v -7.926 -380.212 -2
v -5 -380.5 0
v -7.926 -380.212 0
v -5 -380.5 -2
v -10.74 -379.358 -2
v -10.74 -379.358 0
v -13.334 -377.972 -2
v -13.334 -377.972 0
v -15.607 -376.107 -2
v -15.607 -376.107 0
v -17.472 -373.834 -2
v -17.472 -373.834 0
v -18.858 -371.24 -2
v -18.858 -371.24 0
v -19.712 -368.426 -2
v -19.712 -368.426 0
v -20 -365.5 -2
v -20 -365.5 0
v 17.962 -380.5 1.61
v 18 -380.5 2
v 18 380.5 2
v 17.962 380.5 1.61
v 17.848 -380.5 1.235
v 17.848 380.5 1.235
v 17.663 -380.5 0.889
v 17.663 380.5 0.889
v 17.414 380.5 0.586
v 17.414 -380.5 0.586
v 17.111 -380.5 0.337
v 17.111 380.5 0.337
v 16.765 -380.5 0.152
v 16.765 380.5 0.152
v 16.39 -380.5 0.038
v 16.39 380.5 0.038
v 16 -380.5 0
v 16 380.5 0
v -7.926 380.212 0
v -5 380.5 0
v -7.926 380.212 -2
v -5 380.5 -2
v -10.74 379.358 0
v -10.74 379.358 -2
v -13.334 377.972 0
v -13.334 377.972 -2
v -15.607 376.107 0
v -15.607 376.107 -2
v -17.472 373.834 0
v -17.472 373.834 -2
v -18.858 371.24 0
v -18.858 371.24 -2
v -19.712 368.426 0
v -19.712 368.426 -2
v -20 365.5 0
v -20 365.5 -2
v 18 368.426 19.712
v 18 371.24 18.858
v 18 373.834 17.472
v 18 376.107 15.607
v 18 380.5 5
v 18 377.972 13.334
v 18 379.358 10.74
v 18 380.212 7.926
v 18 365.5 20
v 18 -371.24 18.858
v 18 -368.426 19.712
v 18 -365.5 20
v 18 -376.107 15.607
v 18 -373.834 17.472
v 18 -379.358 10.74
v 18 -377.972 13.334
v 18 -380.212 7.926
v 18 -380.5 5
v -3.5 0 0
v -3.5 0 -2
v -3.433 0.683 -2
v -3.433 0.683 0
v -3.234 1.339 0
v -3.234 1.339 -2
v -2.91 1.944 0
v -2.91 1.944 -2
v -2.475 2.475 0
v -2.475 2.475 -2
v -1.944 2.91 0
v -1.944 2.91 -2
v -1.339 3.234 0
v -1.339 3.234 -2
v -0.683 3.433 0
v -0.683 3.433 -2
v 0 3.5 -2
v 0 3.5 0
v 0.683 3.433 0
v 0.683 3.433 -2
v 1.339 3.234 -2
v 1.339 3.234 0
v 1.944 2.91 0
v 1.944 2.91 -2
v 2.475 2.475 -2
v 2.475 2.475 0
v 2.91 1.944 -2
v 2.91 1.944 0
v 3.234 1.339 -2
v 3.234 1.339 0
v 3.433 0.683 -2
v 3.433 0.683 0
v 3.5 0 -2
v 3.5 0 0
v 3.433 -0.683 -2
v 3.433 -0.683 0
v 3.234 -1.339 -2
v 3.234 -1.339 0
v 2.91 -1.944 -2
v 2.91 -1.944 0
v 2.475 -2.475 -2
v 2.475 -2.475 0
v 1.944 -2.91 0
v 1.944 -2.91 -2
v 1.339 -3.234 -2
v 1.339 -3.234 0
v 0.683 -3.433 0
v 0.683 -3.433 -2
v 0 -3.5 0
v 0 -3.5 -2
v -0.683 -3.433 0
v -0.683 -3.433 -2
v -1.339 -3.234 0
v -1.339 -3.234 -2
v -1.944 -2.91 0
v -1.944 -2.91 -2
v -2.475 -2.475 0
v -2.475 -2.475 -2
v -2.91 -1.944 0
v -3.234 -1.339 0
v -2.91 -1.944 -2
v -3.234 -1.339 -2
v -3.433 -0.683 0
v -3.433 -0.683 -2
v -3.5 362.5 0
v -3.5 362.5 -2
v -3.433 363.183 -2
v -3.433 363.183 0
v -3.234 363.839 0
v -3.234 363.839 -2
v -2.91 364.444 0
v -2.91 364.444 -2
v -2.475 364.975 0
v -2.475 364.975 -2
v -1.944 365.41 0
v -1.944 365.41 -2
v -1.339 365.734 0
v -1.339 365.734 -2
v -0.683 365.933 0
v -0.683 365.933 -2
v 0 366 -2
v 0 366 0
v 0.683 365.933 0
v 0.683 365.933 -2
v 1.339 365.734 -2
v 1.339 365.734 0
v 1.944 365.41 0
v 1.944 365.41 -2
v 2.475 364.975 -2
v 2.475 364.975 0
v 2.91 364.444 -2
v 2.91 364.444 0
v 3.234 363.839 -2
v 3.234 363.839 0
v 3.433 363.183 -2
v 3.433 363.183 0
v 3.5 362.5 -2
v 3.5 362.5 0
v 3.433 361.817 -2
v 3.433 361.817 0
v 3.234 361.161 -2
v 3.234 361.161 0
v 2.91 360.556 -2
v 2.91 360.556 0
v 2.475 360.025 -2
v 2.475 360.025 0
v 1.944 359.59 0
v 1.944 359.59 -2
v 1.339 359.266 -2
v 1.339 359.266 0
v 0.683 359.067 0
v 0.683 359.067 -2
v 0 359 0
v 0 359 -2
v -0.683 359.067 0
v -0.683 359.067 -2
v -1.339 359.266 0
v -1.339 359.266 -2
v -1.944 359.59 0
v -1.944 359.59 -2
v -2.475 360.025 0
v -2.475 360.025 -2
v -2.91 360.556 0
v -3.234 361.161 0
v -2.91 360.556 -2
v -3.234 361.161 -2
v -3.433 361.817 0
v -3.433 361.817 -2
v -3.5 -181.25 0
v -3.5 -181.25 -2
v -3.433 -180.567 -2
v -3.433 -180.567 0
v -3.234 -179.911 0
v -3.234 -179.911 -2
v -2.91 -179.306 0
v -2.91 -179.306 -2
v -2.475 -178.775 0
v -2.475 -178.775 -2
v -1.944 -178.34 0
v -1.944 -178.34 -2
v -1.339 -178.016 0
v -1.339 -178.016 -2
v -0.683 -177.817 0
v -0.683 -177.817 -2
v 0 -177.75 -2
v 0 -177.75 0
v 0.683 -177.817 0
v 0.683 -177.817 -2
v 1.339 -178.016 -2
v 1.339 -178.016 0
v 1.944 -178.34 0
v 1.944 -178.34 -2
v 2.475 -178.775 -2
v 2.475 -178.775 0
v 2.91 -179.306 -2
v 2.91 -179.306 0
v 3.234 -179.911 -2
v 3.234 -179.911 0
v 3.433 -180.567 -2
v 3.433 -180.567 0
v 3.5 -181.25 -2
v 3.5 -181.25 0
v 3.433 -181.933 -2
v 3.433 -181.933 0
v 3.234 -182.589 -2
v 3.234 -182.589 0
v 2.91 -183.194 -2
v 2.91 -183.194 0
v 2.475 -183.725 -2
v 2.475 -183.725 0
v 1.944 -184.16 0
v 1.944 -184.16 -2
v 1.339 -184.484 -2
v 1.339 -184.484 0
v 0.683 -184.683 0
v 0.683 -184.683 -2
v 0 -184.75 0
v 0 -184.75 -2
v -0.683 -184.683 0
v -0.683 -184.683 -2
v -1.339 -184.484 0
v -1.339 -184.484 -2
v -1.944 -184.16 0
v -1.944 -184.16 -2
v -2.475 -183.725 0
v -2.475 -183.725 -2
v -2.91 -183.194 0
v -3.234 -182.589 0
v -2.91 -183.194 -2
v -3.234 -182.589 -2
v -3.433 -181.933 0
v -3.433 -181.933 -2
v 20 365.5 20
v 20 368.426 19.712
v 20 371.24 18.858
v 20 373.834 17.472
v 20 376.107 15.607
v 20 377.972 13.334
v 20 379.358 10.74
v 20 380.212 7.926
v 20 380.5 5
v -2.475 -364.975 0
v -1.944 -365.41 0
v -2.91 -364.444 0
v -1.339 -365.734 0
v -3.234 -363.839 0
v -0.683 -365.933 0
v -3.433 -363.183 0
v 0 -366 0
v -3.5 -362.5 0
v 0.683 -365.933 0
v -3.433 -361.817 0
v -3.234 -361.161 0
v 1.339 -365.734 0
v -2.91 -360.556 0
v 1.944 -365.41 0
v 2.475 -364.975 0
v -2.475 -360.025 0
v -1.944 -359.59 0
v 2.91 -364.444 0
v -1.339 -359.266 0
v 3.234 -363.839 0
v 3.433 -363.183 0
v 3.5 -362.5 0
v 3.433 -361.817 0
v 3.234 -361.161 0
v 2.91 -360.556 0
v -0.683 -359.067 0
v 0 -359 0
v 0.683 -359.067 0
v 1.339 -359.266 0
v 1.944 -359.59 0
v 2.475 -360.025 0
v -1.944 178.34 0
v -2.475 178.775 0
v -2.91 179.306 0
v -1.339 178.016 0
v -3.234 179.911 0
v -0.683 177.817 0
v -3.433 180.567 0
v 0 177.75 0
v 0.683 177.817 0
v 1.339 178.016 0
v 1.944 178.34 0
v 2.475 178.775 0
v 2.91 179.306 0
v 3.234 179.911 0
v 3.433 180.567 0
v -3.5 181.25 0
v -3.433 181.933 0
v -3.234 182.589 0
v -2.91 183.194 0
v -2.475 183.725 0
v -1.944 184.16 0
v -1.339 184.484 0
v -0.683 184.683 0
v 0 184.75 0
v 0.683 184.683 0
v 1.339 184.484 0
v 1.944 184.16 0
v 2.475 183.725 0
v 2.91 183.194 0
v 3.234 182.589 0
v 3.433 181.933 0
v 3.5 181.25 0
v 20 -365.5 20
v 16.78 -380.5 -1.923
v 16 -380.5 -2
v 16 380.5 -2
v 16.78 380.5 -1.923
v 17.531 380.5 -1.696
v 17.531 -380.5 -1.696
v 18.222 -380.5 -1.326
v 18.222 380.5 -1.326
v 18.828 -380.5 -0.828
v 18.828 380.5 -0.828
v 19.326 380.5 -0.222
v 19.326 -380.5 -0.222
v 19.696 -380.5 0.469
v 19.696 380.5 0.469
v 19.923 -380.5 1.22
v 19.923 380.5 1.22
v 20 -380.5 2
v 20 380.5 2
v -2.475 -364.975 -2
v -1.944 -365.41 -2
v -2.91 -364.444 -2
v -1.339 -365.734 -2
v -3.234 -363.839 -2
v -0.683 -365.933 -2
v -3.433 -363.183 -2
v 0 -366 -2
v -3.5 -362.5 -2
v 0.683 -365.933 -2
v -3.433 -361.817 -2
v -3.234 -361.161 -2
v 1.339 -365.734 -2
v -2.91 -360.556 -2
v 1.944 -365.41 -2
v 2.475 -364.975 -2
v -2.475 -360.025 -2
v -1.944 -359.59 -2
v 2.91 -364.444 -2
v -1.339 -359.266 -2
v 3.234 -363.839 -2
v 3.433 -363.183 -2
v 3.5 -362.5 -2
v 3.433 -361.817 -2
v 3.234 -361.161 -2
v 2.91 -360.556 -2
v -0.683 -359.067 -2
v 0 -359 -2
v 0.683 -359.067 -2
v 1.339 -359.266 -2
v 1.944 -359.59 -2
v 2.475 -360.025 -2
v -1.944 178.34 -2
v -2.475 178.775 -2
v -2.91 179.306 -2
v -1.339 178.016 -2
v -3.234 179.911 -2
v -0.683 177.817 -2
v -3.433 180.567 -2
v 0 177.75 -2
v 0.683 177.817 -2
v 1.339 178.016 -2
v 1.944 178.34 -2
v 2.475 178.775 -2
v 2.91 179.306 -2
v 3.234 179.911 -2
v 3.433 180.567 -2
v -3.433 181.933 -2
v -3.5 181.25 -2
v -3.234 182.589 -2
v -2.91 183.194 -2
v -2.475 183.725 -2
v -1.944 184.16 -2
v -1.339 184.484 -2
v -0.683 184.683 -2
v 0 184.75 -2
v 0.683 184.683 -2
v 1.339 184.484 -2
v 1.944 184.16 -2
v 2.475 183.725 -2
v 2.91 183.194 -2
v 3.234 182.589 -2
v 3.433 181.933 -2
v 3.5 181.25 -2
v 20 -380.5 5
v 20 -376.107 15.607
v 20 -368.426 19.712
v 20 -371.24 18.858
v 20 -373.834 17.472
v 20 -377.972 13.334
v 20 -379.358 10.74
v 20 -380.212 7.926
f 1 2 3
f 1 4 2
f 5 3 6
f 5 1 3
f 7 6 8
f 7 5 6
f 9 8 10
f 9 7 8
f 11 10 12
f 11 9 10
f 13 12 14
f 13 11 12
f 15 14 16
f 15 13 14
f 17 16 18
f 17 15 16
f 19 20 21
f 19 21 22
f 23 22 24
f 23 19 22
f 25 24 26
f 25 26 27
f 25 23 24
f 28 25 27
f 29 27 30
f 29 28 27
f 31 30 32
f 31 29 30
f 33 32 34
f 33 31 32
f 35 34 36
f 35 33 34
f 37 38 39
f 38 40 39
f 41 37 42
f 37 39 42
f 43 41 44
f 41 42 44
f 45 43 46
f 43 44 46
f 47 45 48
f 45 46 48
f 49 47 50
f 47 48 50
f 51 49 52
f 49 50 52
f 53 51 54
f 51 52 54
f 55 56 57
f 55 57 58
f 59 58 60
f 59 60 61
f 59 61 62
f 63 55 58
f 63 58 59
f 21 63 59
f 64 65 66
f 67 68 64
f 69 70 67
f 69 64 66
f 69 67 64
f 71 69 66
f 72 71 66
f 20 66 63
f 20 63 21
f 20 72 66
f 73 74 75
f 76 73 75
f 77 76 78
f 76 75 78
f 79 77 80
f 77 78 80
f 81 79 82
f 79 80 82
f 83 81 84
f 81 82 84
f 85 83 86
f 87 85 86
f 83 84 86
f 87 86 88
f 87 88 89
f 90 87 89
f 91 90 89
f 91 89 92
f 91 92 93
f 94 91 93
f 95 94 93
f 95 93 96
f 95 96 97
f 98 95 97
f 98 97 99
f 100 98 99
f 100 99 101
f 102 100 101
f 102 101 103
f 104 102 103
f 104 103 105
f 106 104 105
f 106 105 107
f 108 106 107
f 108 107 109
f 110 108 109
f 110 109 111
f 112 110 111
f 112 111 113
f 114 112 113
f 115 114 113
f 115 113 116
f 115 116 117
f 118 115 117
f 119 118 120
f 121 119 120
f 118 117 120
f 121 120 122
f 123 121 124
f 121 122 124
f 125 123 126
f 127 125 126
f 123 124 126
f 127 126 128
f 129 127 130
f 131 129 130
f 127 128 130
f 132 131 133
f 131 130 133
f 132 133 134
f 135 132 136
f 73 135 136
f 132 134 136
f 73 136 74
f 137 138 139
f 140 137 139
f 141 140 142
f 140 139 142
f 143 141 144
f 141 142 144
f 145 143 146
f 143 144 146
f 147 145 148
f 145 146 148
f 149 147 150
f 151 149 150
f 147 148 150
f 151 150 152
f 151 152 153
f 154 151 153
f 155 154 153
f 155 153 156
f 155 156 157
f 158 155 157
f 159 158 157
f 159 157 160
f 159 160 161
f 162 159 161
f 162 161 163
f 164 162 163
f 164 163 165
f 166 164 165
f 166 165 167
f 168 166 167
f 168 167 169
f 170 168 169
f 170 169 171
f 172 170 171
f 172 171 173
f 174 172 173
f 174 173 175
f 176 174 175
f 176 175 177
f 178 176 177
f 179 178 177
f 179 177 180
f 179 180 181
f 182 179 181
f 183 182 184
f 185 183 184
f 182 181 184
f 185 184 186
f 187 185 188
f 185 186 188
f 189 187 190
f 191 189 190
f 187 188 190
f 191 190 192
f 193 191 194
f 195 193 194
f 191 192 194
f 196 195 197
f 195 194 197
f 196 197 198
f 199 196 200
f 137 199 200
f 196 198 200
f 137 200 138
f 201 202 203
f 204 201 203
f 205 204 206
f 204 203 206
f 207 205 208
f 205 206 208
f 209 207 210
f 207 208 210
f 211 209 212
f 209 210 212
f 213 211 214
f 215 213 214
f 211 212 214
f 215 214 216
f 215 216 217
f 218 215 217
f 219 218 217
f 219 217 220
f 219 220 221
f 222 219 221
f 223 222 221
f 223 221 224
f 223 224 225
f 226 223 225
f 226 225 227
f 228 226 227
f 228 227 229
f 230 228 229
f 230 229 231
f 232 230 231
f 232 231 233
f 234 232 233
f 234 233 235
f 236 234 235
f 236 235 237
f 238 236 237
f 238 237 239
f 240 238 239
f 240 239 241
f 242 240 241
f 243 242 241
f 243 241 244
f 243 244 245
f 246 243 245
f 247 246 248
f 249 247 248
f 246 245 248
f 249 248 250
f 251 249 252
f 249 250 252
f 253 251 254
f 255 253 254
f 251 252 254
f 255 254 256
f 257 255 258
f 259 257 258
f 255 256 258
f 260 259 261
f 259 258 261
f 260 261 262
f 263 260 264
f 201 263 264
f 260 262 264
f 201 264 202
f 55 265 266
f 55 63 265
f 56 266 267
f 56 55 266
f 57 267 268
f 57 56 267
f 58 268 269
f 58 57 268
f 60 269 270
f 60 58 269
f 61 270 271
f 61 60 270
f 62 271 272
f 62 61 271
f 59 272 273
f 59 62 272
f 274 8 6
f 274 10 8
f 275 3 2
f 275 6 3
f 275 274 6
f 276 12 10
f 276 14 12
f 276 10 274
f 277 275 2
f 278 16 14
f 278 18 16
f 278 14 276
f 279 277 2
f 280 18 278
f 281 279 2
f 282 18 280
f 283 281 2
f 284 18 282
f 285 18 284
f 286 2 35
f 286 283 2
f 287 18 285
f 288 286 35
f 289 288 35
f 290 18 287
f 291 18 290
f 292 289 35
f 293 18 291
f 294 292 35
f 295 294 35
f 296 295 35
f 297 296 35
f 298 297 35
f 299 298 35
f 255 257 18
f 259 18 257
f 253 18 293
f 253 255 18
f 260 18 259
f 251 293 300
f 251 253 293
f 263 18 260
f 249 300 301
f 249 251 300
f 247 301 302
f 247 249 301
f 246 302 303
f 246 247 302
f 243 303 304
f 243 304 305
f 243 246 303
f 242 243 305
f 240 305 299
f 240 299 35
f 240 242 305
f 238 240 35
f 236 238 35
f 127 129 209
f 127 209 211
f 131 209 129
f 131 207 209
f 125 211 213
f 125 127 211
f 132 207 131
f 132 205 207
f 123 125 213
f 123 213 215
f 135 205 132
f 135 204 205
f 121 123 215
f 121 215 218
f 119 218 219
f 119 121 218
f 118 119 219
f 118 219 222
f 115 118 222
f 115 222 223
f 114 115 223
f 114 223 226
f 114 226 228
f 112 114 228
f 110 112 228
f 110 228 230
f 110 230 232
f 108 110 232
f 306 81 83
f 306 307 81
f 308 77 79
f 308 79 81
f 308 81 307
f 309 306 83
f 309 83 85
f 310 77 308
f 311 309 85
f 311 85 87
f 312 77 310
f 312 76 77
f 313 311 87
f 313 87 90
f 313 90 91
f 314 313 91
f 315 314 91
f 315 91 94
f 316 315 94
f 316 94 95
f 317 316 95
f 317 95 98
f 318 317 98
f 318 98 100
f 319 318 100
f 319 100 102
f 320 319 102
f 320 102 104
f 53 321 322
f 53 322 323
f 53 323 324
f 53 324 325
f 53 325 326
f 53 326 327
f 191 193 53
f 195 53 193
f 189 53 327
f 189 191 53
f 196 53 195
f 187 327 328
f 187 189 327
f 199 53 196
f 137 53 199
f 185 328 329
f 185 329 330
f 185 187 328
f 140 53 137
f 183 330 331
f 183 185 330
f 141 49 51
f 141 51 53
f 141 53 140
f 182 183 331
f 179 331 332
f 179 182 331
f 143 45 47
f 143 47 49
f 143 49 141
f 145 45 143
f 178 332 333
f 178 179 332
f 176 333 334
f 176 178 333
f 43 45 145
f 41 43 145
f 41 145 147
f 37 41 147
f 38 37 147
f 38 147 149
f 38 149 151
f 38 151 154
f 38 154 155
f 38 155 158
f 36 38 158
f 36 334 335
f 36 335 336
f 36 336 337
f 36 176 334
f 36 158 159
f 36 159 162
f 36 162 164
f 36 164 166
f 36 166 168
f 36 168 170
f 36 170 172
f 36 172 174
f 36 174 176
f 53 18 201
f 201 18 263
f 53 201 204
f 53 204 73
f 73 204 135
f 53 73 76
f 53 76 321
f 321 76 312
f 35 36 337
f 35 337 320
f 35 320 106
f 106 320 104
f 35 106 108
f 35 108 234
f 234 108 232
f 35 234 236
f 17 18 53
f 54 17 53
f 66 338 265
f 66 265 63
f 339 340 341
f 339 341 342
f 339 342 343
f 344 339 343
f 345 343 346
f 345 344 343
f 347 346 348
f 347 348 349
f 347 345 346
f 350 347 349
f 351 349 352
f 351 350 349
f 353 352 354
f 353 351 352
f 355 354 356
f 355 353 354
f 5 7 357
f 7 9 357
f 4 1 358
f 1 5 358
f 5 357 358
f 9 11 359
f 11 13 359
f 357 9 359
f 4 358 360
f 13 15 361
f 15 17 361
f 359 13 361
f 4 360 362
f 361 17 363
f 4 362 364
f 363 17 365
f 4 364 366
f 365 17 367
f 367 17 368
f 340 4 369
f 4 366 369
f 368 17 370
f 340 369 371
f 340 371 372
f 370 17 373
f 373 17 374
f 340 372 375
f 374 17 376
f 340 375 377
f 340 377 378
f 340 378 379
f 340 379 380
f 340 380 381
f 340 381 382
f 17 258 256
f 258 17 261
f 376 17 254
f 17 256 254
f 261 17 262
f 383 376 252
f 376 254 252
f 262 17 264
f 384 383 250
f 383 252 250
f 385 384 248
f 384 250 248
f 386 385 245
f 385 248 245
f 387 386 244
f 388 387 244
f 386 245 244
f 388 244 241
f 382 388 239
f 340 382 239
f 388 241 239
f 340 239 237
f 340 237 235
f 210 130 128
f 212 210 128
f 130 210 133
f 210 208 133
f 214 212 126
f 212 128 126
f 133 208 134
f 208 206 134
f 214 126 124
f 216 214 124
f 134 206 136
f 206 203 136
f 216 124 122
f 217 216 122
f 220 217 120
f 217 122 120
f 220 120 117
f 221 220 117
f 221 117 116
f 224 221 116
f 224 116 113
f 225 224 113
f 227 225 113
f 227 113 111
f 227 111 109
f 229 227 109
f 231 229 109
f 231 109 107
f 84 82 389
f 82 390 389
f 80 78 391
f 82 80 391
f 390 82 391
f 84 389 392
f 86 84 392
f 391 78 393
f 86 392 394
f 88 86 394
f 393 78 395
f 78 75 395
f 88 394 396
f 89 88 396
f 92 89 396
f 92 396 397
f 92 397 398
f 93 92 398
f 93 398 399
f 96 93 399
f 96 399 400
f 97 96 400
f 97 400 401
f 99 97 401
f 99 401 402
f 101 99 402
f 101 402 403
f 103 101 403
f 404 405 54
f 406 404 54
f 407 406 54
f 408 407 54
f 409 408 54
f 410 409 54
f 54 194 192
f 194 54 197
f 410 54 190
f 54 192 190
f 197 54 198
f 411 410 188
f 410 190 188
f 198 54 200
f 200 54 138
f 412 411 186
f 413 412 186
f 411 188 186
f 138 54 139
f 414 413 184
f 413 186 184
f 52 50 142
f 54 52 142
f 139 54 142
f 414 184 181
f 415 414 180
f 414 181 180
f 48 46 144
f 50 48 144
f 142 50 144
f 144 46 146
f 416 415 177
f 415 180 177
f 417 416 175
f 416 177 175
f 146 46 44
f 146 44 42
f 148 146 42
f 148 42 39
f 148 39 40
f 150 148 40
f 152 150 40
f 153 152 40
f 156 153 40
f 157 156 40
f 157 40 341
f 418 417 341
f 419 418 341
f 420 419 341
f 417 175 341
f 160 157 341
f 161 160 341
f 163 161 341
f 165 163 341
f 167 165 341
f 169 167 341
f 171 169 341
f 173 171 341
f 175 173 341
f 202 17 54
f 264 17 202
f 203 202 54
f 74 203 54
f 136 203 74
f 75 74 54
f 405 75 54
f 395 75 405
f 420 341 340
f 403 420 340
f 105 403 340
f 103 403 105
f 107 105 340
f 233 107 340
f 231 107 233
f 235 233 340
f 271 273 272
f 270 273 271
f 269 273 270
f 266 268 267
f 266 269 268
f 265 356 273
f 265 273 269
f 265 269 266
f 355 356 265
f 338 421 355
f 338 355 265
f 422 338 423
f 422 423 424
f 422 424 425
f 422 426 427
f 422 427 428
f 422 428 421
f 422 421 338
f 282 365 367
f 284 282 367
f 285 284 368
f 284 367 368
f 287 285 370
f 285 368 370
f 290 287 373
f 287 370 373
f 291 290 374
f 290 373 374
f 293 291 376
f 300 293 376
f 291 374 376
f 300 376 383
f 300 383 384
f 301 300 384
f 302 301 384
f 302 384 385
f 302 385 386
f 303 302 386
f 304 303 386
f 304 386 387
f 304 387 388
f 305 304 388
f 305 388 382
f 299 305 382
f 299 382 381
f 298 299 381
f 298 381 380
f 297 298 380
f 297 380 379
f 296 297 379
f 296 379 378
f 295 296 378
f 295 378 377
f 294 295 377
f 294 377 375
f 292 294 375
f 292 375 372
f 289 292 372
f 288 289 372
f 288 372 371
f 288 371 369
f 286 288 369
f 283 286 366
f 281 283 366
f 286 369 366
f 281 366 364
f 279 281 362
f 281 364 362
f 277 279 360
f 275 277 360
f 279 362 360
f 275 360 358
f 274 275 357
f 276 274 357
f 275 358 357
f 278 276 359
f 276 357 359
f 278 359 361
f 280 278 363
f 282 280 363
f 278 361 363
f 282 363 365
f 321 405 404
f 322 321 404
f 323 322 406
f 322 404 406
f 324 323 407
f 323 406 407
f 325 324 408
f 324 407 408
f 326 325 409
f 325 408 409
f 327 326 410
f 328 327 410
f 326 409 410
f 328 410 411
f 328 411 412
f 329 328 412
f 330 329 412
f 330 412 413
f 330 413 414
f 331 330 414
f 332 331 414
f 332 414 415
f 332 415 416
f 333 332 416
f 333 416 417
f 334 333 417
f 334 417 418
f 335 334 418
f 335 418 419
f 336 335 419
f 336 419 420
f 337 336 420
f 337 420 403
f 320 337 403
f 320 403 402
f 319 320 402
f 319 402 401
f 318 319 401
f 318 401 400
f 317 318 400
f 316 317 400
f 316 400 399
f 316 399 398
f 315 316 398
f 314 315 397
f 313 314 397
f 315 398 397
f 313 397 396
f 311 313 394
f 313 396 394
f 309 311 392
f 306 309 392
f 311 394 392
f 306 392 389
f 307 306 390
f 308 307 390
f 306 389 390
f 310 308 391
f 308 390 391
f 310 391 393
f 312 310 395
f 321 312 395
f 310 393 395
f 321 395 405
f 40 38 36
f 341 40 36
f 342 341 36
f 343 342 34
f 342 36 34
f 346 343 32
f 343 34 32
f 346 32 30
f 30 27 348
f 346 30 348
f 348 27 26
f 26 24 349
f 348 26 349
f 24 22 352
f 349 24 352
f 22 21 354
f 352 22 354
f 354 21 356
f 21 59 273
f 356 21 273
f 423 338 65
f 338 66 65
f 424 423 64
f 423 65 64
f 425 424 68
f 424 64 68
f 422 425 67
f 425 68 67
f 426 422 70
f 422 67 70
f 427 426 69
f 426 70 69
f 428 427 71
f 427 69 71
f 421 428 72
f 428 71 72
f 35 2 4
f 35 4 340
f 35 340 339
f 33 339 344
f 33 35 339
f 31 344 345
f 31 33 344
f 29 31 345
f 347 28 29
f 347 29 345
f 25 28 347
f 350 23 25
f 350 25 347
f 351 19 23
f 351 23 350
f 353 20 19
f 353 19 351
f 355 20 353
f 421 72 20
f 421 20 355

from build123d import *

# Parameters (mm, degrees)
SKETCH2_W                    = 40
SKETCH2_H                    = 761
BASE_FLANGE1_DEPTH           = 2
EDGE_FLANGE1_STRIP_W         = 12
EDGE_FLANGE1_STRIP_H         = 2
EDGE_FLANGE1_STRIP_CUT_DEPTH = 761
EDGE_FLANGE1_DEPTH           = 761
FILLET1_R                    = 15
F_7_0_7_DIAMETER_HOLE1_D     = 7


# Sheet-metal steps are written as plain solids
with BuildPart() as part:
    # Sketch2 → Base-Flange1 (new body)
    with BuildSketch(Plane.XY):
        Rectangle(SKETCH2_W, SKETCH2_H)
    extrude(amount=-BASE_FLANGE1_DEPTH)

    # Edge-Flange1 strip (across the edge) → Edge-Flange1 strip cut (cut)
    with BuildSketch(Plane(origin=(20, -380.5, 0), x_dir=(-1, 0, 0), z_dir=(0, 1, 0))):
        with Locations((-2, -1)):
            Rectangle(EDGE_FLANGE1_STRIP_W, EDGE_FLANGE1_STRIP_H)
    extrude(amount=EDGE_FLANGE1_STRIP_CUT_DEPTH, mode=Mode.SUBTRACT)

    # Edge-Flange1 section (across the edge) → Edge-Flange1 (add)
    with BuildSketch(Plane(origin=(20, -380.5, 0), x_dir=(-1, 0, 0), z_dir=(0, 1, 0))):
        with BuildLine():
            Line((0, 2), (0, 20))
            Line((0, 20), (2, 20))
            Line((2, 20), (2, 2))
            ThreePointArc((2, 2), (2.585786438, 0.585786438), (4, 0))
            Line((4, 0), (4, -2))
            ThreePointArc((4, -2), (1.171572875, -0.828427125), (0, 2))
        make_face()
    extrude(amount=EDGE_FLANGE1_DEPTH)

    # Fillet1
    fillet1_edges = [part.edges().sort_by_distance(p)[0] for p in [
        (19, -380.5, 20),
        (19, 380.5, 20),
        (-20, -380.5, -1),
        (-20, 380.5, -1),
    ]]
    fillet(fillet1_edges, radius=FILLET1_R)

    # Ø7.0 (7) Diameter Hole1 (through all)
    with Locations(Plane.XY):
        with Locations((0, 362.5), (0, 181.25), (0, 0), (0, -181.25), (0, -362.5)):
            Hole(F_7_0_7_DIAMETER_HOLE1_D / 2)


solid = part.part
